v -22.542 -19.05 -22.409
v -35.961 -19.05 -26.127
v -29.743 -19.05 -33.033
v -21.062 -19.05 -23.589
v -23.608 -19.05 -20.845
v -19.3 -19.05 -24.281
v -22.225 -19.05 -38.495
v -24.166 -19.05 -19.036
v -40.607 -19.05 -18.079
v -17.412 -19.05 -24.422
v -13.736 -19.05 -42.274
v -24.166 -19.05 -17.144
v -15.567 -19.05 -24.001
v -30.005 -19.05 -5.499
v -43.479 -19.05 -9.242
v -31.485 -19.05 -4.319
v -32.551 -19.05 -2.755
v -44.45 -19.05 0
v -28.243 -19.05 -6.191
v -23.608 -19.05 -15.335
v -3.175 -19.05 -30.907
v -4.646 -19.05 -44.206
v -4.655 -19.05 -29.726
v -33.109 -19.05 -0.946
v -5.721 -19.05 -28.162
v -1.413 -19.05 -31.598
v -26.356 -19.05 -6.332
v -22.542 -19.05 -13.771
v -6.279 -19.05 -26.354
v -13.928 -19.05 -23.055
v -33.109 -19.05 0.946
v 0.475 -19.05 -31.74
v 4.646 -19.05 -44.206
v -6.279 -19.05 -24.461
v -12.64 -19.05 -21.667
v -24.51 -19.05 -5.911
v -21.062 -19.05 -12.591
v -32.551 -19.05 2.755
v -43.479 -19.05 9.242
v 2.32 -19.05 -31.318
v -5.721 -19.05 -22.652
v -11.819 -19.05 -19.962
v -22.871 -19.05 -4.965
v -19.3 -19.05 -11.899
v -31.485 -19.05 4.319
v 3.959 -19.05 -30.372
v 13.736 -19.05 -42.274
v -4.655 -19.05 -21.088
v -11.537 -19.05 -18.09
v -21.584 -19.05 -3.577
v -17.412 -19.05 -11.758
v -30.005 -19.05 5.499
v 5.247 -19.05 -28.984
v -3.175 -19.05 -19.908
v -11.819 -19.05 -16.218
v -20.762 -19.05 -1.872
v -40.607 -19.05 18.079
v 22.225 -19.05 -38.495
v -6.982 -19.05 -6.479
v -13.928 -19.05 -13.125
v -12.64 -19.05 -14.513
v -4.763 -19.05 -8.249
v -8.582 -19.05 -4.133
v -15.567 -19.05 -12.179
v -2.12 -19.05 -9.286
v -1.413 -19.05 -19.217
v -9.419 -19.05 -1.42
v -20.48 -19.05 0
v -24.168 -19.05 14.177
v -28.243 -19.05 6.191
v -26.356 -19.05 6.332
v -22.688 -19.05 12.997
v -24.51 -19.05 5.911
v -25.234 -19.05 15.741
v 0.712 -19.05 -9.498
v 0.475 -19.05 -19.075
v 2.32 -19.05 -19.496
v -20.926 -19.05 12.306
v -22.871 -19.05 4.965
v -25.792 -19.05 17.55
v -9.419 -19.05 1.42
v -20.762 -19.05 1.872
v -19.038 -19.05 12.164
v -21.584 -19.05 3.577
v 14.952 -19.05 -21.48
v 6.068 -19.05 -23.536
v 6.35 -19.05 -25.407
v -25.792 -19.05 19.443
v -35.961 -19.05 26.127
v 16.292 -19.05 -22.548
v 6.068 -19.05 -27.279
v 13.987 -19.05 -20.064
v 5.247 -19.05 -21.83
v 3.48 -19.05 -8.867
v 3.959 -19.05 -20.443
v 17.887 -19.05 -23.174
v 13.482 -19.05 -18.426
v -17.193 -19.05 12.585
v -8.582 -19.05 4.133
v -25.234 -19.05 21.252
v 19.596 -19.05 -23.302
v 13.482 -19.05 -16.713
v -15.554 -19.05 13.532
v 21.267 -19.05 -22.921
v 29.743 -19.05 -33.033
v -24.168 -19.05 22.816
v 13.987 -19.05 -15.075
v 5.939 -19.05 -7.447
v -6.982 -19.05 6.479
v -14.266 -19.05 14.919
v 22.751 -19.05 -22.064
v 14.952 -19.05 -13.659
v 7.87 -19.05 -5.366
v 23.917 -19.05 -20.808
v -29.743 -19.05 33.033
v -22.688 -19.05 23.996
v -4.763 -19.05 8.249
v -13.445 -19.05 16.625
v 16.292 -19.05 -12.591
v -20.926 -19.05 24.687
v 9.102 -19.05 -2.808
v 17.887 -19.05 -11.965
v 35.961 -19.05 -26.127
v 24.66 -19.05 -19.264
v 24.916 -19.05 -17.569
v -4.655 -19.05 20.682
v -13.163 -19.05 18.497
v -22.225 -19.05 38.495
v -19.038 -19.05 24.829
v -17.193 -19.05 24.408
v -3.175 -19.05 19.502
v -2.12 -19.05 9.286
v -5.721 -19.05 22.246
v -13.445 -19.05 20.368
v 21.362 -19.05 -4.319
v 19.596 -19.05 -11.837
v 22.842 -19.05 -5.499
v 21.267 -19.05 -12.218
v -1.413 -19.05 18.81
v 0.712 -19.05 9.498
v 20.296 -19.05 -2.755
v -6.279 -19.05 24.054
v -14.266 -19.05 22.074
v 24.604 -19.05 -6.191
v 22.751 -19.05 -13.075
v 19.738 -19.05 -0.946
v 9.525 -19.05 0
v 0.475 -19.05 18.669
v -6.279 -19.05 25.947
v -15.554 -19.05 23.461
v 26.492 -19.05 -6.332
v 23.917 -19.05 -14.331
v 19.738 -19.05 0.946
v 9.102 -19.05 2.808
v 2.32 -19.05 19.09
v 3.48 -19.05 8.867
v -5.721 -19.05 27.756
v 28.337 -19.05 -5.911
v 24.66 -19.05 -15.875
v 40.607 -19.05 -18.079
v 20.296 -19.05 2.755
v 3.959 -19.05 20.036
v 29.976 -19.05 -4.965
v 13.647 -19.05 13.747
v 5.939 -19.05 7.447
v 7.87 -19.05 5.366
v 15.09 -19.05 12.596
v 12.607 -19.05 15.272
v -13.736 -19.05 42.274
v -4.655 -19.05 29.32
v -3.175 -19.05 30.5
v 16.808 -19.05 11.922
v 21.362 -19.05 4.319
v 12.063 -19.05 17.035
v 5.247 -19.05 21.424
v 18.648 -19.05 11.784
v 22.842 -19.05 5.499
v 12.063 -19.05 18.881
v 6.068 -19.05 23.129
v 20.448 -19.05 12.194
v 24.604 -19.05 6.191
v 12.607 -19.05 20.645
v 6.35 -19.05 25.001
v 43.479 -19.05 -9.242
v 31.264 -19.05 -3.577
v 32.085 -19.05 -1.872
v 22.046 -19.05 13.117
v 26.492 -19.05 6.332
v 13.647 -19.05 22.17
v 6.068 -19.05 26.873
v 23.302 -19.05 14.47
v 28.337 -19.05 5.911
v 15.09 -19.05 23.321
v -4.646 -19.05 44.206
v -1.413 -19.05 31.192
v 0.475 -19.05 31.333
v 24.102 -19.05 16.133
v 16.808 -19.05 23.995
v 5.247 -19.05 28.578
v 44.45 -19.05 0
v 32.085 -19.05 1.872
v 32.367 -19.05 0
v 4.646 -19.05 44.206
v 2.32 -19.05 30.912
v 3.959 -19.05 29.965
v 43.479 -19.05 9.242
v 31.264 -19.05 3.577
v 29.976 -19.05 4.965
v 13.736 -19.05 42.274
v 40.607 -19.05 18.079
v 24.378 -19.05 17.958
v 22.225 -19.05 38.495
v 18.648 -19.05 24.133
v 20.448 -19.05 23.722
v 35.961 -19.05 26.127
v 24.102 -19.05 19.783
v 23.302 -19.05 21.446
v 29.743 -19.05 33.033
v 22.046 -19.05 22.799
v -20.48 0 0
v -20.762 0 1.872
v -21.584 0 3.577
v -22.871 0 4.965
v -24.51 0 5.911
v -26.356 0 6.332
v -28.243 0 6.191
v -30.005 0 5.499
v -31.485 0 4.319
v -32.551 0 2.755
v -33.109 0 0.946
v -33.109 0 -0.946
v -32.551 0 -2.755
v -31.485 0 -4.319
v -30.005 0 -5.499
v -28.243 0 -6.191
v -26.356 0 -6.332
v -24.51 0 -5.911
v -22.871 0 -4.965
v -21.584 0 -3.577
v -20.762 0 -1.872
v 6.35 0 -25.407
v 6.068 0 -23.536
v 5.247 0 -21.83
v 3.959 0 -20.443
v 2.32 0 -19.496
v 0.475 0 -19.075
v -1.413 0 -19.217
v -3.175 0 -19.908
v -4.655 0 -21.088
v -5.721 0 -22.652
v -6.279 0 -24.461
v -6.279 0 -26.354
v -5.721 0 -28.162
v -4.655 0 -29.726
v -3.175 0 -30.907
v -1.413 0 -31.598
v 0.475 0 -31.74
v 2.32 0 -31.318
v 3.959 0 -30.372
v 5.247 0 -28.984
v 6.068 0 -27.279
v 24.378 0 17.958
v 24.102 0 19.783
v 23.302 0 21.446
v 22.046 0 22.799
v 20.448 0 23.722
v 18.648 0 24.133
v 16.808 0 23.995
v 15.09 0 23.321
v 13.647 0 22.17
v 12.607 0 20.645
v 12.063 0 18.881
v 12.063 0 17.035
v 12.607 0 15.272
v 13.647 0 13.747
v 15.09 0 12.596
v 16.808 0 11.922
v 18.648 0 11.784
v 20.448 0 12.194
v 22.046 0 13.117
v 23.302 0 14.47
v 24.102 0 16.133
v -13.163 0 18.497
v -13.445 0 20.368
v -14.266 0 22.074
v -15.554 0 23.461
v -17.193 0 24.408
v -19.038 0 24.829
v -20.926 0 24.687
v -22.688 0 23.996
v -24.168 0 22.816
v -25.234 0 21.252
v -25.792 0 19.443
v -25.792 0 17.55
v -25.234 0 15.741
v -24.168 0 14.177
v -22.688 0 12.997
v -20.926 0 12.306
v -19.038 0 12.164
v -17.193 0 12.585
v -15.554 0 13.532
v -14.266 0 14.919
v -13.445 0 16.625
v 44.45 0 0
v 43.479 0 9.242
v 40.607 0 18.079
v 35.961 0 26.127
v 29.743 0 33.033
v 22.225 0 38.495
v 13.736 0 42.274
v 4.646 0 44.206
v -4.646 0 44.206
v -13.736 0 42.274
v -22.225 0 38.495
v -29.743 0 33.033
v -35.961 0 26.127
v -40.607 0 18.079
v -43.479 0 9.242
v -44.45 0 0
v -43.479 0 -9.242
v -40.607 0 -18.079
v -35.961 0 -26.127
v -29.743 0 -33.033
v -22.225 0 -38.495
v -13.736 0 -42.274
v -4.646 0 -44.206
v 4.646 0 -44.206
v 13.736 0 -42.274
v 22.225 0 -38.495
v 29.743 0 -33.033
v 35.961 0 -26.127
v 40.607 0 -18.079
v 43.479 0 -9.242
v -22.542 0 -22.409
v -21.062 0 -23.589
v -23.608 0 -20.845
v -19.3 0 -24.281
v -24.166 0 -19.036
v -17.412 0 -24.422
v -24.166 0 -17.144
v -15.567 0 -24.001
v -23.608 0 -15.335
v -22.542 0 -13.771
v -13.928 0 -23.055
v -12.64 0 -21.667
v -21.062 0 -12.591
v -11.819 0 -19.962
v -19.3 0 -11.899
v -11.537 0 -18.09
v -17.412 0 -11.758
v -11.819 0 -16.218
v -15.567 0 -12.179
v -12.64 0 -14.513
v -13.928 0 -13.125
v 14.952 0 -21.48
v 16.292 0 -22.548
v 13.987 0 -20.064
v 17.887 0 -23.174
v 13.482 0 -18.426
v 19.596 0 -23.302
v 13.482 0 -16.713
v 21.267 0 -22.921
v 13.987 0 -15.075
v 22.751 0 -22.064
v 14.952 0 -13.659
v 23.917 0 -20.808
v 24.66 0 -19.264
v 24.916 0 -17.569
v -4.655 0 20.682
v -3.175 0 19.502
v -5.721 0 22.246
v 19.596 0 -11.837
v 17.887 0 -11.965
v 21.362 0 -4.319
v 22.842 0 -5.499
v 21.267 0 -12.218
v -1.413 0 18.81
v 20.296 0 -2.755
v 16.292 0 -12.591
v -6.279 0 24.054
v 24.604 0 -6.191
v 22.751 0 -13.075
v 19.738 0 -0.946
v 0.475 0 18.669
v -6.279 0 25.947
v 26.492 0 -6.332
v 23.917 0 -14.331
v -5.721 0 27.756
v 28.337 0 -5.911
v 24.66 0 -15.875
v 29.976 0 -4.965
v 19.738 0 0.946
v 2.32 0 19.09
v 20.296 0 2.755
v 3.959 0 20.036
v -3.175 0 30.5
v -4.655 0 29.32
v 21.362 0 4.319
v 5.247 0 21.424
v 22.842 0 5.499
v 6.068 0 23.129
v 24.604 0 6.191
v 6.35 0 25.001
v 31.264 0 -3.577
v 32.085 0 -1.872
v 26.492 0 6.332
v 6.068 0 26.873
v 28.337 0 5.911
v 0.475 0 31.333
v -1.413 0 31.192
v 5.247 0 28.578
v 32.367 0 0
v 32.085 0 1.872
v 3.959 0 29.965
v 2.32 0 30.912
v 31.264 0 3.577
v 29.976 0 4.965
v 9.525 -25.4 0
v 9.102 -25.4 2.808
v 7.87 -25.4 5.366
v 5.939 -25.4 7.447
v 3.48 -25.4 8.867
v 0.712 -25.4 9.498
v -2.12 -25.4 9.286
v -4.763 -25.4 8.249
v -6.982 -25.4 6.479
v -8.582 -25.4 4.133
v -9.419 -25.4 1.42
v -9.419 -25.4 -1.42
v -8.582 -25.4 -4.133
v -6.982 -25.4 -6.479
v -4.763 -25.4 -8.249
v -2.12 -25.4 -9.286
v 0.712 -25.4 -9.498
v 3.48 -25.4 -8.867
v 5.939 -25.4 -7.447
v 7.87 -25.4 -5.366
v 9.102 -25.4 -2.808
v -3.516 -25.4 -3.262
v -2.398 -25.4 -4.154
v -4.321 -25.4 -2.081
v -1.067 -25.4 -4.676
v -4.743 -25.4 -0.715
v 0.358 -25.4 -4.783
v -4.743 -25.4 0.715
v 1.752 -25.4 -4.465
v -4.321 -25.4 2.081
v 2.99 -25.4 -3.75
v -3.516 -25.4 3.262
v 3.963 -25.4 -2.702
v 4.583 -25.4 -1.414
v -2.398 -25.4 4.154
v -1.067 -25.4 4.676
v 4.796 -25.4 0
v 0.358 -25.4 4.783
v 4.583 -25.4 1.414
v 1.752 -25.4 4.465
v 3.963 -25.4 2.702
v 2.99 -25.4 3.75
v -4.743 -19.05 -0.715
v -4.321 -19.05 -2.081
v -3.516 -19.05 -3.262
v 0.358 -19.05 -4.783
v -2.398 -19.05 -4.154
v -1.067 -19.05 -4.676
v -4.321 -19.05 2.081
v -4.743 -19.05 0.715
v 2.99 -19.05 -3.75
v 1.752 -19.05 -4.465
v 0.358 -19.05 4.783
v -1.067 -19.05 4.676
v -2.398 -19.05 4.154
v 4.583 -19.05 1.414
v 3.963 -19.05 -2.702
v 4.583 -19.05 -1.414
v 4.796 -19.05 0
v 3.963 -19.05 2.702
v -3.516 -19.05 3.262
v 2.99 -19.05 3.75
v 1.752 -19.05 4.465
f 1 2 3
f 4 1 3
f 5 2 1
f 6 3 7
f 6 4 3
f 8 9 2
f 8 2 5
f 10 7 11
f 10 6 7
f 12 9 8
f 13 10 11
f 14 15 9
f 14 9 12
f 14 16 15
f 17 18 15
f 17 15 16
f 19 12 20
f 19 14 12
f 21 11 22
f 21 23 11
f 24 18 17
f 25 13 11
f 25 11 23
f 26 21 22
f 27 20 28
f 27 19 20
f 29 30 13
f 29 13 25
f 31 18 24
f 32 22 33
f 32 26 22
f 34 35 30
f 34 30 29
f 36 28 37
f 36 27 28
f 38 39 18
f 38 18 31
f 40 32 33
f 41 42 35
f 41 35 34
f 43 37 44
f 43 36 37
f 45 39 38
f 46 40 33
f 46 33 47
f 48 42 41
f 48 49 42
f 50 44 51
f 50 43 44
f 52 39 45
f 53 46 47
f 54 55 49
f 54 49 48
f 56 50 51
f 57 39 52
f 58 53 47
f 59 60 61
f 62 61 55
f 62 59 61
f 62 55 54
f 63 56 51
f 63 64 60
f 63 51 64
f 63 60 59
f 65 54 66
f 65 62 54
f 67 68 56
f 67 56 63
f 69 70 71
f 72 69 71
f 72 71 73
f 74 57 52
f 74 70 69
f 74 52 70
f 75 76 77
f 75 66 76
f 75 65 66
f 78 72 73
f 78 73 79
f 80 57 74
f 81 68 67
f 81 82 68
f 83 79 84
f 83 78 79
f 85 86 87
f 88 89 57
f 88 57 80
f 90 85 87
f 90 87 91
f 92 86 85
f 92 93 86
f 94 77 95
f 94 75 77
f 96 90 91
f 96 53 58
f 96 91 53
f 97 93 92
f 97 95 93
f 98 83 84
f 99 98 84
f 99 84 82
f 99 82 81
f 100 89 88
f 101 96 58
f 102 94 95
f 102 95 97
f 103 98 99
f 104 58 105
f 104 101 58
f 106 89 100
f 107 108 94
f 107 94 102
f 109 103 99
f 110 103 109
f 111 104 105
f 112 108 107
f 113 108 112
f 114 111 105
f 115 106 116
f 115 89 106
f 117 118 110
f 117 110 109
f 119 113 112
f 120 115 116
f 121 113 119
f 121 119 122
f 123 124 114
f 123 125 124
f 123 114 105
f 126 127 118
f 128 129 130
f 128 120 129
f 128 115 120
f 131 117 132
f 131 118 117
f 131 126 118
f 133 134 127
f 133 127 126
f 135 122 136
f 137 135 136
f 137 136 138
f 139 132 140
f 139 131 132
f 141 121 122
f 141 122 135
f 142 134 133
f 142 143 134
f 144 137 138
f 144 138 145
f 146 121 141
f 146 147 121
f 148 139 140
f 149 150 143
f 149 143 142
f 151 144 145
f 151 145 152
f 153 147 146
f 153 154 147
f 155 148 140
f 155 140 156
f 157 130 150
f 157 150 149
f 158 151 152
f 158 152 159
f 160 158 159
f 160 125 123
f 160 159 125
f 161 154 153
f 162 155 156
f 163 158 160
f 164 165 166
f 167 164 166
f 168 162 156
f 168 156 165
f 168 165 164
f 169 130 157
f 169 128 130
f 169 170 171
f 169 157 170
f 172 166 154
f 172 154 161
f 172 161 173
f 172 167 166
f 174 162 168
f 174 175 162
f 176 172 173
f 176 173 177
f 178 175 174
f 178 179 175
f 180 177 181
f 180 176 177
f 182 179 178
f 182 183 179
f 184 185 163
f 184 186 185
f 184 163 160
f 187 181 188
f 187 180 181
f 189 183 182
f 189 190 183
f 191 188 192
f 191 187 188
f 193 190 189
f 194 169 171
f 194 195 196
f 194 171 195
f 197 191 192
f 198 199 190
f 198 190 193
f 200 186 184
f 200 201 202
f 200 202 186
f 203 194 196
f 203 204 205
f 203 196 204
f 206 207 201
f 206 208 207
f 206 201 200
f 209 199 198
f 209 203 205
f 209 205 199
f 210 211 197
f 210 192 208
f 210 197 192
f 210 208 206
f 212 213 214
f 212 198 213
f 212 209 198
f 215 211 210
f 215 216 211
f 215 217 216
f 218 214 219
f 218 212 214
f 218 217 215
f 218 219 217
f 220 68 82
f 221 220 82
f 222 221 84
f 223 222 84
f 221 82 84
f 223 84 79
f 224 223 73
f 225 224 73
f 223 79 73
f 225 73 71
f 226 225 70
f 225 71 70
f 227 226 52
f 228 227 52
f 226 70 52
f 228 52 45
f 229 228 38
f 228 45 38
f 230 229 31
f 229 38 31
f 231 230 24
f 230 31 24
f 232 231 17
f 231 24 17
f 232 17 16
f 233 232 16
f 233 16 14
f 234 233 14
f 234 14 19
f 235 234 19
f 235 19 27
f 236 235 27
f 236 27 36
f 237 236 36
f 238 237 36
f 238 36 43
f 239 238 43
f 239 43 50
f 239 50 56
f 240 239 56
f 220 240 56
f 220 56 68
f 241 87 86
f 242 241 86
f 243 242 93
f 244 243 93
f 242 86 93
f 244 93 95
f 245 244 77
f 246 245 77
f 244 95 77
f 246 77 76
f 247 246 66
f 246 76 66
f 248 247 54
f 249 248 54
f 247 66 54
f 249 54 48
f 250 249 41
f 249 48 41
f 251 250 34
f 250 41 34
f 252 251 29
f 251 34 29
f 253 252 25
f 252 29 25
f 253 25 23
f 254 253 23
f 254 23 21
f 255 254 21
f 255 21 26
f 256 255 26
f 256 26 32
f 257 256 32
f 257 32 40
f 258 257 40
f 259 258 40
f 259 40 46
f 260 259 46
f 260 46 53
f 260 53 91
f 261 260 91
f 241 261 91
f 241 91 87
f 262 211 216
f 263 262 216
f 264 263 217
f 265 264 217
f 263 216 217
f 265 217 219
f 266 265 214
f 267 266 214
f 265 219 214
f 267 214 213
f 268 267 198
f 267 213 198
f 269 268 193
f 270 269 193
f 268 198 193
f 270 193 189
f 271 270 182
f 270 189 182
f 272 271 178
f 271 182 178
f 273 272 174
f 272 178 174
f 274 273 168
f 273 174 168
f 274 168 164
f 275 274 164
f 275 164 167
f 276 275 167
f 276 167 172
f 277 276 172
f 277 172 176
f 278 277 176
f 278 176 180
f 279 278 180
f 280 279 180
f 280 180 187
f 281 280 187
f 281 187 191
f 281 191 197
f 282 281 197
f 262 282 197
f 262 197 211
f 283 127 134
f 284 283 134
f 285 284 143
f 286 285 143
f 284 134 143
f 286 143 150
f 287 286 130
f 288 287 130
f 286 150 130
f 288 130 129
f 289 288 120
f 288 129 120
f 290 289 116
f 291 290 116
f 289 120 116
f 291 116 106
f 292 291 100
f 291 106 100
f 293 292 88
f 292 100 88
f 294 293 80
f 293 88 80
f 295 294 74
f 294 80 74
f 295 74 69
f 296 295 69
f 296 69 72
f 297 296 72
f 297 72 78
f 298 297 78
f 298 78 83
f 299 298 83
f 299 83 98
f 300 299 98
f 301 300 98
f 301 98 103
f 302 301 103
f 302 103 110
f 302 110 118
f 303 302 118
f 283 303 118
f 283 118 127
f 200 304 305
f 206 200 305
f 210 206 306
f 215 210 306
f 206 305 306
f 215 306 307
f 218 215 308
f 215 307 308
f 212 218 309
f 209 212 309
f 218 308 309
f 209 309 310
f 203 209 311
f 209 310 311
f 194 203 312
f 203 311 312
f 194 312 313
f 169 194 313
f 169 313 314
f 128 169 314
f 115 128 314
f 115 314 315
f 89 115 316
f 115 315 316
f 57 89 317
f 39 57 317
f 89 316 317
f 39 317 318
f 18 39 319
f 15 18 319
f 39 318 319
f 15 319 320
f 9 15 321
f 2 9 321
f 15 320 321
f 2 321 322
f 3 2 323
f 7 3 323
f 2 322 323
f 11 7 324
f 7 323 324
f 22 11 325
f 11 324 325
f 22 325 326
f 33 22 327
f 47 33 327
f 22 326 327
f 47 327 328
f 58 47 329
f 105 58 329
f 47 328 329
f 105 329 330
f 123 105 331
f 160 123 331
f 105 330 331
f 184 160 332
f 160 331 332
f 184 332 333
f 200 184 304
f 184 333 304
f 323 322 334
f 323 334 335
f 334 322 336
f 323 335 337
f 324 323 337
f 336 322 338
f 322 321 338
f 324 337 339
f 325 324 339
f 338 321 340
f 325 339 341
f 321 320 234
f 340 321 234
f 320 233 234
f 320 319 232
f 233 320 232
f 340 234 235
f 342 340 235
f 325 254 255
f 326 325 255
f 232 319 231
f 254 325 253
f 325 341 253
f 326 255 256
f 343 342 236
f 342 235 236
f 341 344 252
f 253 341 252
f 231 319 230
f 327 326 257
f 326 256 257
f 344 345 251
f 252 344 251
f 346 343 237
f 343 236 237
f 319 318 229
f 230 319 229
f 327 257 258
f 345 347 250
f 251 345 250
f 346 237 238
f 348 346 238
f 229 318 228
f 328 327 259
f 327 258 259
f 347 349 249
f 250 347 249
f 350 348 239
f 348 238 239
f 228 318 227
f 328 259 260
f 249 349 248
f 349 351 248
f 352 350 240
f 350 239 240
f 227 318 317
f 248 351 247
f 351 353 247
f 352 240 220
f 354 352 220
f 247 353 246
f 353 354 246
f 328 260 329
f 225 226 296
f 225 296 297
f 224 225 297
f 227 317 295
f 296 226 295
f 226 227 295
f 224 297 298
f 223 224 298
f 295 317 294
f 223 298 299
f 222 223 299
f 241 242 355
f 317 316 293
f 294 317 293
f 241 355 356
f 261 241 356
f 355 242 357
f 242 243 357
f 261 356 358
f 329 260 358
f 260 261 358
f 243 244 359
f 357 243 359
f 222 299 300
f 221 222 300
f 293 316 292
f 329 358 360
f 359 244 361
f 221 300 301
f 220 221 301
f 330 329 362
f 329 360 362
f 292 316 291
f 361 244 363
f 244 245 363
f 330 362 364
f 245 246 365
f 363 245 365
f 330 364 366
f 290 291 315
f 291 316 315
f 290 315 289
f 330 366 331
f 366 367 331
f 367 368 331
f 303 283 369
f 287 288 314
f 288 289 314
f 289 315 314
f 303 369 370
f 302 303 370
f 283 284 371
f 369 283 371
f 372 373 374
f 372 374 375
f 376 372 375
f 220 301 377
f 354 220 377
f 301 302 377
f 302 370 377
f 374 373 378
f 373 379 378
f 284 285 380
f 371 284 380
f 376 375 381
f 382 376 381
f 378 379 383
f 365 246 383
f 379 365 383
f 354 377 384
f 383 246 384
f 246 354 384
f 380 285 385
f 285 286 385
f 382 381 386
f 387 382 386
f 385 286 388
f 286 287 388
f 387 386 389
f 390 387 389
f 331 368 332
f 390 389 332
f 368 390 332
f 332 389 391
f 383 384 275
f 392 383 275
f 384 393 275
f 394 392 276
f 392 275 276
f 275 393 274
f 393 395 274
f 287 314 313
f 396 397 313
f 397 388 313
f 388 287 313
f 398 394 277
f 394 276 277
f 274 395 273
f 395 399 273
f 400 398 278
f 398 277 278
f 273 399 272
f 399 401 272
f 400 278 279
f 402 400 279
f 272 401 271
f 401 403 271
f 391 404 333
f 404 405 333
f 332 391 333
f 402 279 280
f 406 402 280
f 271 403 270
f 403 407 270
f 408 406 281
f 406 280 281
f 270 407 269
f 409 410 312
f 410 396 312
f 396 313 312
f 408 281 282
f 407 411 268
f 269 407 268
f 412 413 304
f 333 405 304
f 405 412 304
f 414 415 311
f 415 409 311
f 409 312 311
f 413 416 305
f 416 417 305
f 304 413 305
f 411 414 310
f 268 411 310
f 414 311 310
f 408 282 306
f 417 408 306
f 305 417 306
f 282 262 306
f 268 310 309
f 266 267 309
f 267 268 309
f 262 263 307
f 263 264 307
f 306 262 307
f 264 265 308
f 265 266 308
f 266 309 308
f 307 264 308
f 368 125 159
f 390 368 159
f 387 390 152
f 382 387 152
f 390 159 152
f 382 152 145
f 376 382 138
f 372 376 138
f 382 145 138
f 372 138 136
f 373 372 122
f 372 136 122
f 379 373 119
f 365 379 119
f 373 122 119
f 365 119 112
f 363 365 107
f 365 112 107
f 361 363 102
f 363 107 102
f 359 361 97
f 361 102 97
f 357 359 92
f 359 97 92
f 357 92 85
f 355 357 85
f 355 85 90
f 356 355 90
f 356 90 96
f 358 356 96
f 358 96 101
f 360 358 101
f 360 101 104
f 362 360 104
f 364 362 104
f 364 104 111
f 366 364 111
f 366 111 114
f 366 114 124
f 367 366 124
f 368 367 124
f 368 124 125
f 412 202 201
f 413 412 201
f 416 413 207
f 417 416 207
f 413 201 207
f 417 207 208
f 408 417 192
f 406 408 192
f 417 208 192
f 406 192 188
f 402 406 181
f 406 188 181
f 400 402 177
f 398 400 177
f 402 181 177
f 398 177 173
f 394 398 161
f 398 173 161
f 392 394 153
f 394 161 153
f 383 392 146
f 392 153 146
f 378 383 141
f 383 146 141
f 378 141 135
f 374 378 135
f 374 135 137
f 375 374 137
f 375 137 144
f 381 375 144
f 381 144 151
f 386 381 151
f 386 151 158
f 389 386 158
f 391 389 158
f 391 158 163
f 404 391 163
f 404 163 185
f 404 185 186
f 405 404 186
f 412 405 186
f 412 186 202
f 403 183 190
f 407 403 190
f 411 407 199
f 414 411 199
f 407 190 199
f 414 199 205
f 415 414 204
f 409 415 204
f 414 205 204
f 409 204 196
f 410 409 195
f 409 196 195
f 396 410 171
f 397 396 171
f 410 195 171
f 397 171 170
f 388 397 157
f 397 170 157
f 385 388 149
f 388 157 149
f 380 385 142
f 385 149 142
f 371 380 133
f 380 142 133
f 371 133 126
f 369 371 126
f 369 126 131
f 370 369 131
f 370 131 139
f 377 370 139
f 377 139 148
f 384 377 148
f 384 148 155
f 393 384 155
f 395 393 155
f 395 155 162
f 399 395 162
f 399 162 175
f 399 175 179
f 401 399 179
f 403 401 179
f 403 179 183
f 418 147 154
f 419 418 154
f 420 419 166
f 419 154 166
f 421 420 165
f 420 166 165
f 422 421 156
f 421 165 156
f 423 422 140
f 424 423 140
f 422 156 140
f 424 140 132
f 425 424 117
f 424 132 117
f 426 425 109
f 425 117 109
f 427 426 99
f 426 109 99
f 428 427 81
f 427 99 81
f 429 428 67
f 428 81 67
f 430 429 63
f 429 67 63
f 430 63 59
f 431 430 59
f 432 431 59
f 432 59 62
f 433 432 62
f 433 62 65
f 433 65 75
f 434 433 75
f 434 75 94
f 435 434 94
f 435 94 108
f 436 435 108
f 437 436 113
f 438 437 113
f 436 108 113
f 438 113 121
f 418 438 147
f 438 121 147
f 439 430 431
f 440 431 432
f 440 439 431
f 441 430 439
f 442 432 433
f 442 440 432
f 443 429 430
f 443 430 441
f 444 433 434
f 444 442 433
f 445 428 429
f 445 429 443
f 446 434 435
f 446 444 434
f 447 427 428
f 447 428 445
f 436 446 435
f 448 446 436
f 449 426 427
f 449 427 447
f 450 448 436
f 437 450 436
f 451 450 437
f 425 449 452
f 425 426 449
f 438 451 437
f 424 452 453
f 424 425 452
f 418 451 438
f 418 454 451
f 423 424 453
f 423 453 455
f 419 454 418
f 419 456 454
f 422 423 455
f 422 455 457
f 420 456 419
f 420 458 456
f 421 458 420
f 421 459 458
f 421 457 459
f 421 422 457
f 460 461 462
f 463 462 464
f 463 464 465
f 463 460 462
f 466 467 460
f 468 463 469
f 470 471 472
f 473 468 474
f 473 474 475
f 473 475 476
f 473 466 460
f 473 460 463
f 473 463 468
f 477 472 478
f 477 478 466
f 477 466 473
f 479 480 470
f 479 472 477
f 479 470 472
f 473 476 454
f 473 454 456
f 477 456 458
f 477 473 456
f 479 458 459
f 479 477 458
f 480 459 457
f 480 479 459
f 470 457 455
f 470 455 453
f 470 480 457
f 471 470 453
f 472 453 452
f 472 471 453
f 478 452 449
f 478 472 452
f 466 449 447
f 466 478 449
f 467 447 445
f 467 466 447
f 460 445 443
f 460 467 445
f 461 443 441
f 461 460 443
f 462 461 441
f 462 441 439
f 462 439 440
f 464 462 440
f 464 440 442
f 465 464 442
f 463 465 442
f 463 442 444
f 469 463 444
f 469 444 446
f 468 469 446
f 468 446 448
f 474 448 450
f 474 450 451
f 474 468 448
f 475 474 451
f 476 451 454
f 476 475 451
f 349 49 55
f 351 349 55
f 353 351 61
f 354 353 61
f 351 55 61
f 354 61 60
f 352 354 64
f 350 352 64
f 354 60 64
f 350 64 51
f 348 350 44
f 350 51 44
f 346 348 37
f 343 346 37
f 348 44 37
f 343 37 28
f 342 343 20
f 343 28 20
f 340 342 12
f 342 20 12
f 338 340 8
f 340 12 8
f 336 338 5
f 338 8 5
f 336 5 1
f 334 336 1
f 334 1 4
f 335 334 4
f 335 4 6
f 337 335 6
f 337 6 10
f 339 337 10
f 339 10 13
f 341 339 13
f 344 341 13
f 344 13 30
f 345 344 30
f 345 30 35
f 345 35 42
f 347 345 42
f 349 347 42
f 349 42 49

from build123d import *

# Parameters (mm, degrees)
F0_R     = 44.45
F1_DEPTH = 19.05
F2_R     = 6.35
F2_R_2   = 6.191887
F2_R_3   = 5.749023
F3_DEPTH = 25.4
F4_R     = 9.525
F4_R_2   = 4.796192
F5_DEPTH = 6.35


with BuildPart() as f1:
    # F0 (on Front) → F1 (new body)
    with BuildSketch(Plane.XZ):
        Circle(F0_R)
    extrude(amount=F1_DEPTH)

    # F2 (on face) → F3 (cut)
    with BuildSketch(Plane.XZ.offset(19.05)):
        with Locations((0, 25.000811)):
            Circle(F2_R)
        with Locations((0, -25.407325)):
            Circle(F2_R)
        with Locations((26.017097, 0)):
            Circle(F2_R)
        with Locations((-26.830139, 0)):
            Circle(F2_R)
        with Locations((18.185616, 17.9583)):
            Circle(F2_R_2)
        with Locations((19.16673, -17.569499)):
            Circle(F2_R_3)
        with Locations((-17.886758, -18.090015)):
            Circle(F2_R)
        with Locations((-19.512825, 18.496535)):
            Circle(F2_R)
    extrude(amount=-F3_DEPTH, mode=Mode.SUBTRACT)

    # F4 (on face) → F5 (join)
    with BuildSketch(Plane.XZ.offset(19.05)):
        Circle(F4_R)
        Circle(F4_R_2, mode=Mode.SUBTRACT)
    extrude(amount=F5_DEPTH)


solid = f1.part
